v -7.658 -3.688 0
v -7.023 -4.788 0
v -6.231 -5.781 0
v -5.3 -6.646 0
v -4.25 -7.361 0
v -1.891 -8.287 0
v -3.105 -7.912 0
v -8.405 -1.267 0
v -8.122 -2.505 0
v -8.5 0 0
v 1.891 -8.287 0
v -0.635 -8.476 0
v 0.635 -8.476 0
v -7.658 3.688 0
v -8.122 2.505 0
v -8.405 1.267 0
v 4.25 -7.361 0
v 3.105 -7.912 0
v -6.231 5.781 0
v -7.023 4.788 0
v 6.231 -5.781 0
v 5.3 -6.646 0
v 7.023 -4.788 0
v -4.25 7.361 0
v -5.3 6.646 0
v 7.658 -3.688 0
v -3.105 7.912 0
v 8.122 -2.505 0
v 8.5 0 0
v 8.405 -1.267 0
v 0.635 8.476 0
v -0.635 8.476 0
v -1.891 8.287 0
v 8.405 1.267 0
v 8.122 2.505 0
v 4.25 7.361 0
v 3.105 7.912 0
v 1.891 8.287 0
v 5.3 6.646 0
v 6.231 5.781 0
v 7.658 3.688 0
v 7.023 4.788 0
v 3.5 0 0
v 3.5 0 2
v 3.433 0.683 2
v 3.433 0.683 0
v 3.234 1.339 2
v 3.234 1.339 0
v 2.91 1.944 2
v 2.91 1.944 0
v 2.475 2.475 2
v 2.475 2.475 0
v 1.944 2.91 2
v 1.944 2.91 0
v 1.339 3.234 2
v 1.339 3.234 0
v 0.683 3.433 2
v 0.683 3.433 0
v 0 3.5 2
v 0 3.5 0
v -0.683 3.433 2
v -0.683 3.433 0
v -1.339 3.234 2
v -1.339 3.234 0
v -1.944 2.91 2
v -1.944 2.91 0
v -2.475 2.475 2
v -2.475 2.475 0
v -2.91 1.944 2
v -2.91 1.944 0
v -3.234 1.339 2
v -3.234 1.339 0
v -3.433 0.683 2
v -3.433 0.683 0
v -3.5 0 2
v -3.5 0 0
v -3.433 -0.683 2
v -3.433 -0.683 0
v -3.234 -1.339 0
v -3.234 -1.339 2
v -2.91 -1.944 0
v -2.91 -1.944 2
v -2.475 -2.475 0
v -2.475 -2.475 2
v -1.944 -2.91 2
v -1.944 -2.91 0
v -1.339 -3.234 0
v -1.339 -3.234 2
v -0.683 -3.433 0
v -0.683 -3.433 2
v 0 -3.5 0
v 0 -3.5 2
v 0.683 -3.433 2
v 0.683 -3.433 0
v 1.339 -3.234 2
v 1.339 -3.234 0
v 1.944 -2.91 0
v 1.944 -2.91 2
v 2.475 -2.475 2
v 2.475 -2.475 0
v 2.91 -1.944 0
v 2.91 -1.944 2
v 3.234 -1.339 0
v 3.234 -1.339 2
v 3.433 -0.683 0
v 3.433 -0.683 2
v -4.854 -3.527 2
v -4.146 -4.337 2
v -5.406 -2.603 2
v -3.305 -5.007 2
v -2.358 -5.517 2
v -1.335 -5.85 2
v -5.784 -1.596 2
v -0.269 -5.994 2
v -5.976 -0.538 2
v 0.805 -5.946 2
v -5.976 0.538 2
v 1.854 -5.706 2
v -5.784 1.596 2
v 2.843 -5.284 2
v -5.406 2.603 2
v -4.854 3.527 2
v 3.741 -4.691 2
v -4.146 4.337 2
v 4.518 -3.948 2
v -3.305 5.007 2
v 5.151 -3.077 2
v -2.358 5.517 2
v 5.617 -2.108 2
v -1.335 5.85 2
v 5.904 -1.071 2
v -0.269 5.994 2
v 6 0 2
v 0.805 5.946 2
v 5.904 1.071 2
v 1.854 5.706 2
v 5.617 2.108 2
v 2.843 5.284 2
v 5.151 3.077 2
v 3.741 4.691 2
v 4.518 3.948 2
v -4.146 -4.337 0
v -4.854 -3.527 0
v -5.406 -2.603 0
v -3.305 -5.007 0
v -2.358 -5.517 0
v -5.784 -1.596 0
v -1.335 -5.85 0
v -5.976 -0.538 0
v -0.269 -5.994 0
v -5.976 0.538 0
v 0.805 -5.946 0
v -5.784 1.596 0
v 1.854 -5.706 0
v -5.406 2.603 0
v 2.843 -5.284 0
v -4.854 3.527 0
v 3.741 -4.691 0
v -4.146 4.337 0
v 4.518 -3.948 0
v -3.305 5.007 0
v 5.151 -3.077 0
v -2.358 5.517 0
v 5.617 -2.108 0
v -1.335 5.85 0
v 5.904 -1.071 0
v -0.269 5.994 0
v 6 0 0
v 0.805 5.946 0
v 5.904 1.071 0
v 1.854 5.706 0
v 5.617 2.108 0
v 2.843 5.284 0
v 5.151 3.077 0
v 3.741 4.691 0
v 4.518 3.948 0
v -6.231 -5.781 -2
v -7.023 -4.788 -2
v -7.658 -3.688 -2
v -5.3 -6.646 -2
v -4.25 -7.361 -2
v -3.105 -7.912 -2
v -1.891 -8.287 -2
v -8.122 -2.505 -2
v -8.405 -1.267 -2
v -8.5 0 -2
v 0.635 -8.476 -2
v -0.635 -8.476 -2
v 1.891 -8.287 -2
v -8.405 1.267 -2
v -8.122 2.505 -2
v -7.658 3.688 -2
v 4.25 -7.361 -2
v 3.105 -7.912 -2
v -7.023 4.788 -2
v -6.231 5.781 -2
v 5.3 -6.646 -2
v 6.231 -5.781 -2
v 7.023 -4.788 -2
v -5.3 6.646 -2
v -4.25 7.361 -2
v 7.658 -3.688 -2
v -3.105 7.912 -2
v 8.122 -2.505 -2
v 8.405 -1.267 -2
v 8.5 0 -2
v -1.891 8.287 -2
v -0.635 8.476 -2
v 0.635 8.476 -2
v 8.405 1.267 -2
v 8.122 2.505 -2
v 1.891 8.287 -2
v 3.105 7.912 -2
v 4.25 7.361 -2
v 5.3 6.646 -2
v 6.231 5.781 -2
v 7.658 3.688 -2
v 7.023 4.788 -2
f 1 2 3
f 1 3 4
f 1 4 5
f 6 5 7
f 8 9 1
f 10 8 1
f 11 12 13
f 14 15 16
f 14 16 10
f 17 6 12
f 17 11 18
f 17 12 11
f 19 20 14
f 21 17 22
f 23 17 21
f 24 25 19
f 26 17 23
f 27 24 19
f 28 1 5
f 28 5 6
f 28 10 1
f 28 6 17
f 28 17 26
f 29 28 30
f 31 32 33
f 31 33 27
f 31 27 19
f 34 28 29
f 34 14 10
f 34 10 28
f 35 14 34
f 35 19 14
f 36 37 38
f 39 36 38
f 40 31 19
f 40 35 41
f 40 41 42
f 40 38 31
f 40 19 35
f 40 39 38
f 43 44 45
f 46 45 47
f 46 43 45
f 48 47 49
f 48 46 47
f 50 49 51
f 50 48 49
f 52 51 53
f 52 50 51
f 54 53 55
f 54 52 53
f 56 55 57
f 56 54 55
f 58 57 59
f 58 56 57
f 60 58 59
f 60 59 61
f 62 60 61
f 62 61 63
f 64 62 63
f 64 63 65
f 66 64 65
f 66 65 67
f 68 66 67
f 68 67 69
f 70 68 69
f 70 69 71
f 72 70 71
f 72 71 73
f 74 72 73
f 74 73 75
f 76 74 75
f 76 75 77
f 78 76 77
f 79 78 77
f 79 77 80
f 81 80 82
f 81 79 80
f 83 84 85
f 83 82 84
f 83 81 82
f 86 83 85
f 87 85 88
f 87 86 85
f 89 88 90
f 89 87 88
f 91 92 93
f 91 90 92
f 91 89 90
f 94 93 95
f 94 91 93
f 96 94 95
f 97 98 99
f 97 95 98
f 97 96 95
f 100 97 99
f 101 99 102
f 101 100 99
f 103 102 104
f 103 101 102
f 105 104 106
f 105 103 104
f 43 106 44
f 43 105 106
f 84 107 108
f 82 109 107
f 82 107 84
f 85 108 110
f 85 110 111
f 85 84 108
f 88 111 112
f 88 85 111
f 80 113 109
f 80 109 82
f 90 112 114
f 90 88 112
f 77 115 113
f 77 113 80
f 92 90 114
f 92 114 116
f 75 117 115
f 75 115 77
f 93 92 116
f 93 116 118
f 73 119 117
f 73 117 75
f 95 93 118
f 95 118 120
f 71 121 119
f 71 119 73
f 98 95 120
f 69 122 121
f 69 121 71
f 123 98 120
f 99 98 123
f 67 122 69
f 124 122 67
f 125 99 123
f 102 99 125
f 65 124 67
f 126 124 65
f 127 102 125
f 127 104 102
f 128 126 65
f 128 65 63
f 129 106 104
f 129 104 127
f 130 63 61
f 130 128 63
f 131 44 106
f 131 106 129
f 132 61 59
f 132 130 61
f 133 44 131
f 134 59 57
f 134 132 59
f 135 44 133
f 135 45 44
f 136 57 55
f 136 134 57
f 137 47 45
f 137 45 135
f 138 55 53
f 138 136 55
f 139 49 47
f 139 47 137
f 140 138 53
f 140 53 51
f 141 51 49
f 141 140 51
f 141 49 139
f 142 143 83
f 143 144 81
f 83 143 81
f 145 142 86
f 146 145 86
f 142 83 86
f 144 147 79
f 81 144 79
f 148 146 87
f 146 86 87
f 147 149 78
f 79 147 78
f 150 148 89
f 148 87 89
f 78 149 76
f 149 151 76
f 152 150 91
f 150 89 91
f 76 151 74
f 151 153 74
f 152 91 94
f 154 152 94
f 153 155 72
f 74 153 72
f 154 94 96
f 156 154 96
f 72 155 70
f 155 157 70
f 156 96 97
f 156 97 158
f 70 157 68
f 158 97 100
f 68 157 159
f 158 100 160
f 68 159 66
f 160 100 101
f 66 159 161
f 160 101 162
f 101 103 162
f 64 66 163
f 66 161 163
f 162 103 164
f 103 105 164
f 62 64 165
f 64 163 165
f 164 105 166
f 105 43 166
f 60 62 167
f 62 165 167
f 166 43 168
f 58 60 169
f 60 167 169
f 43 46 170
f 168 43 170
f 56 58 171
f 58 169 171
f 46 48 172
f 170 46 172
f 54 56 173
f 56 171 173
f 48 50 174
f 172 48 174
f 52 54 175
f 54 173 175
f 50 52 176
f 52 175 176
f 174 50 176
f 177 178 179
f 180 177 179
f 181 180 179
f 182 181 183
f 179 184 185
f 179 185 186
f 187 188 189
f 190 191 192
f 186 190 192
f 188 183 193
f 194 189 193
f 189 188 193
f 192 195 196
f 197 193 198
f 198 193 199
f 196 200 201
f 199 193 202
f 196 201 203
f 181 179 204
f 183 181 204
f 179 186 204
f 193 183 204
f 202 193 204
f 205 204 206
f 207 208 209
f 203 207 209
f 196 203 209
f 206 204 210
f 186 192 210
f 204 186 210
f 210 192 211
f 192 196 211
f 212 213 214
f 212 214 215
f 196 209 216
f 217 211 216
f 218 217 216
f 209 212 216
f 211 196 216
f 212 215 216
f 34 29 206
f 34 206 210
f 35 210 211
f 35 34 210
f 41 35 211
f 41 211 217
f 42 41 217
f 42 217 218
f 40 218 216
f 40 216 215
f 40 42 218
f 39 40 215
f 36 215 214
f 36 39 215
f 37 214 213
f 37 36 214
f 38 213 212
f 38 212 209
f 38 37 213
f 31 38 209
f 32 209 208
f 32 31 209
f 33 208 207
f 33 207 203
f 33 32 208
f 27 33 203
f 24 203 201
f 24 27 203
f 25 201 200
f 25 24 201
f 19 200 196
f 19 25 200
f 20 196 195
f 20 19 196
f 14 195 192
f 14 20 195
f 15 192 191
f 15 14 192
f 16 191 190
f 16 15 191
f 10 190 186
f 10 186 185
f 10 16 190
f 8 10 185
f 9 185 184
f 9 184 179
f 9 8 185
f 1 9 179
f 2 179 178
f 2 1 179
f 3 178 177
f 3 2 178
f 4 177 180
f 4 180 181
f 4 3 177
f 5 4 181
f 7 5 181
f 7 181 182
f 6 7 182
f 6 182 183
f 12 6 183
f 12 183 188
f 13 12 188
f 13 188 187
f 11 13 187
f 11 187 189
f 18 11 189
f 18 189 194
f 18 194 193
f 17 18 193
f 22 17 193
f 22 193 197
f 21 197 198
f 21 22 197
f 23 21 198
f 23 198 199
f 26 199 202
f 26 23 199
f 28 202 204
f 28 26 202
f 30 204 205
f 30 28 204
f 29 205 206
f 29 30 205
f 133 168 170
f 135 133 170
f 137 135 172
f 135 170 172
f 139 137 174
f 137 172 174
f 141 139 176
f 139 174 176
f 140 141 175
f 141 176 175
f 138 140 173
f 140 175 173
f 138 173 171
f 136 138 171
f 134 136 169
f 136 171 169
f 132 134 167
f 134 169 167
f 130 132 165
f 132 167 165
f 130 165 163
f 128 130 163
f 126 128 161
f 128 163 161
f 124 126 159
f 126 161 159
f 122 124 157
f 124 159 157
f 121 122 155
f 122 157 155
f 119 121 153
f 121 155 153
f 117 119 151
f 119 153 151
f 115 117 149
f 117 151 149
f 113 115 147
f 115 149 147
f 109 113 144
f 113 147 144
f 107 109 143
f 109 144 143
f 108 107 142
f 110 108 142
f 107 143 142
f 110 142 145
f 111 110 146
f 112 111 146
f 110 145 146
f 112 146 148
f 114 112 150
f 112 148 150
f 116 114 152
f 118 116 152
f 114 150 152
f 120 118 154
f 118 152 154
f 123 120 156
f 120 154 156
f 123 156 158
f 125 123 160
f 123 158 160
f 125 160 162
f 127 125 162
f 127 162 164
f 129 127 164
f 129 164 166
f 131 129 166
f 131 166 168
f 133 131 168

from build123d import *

# Parameters (mm, degrees)
F0_R     = 8.5
F3_DEPTH = 2
F1_R     = 6
F4_DEPTH = 2
F2_R     = 3.5
F5_DEPTH = 25


with BuildPart() as f3:
    # F0 (on Top) → F3 (new body)
    with BuildSketch(Plane.XY):
        Circle(F0_R)
    extrude(amount=-F3_DEPTH)


with BuildPart() as f4:
    # F1 (on Top) → F4 (new body)
    with BuildSketch(Plane.XY):
        Circle(F1_R)
    extrude(amount=F4_DEPTH)

    # F2 (on Top) → F5 (cut)
    with BuildSketch(Plane.XY):
        Circle(F2_R)
    extrude(amount=F5_DEPTH, mode=Mode.SUBTRACT)


solid = Compound([f3.part, f4.part])
